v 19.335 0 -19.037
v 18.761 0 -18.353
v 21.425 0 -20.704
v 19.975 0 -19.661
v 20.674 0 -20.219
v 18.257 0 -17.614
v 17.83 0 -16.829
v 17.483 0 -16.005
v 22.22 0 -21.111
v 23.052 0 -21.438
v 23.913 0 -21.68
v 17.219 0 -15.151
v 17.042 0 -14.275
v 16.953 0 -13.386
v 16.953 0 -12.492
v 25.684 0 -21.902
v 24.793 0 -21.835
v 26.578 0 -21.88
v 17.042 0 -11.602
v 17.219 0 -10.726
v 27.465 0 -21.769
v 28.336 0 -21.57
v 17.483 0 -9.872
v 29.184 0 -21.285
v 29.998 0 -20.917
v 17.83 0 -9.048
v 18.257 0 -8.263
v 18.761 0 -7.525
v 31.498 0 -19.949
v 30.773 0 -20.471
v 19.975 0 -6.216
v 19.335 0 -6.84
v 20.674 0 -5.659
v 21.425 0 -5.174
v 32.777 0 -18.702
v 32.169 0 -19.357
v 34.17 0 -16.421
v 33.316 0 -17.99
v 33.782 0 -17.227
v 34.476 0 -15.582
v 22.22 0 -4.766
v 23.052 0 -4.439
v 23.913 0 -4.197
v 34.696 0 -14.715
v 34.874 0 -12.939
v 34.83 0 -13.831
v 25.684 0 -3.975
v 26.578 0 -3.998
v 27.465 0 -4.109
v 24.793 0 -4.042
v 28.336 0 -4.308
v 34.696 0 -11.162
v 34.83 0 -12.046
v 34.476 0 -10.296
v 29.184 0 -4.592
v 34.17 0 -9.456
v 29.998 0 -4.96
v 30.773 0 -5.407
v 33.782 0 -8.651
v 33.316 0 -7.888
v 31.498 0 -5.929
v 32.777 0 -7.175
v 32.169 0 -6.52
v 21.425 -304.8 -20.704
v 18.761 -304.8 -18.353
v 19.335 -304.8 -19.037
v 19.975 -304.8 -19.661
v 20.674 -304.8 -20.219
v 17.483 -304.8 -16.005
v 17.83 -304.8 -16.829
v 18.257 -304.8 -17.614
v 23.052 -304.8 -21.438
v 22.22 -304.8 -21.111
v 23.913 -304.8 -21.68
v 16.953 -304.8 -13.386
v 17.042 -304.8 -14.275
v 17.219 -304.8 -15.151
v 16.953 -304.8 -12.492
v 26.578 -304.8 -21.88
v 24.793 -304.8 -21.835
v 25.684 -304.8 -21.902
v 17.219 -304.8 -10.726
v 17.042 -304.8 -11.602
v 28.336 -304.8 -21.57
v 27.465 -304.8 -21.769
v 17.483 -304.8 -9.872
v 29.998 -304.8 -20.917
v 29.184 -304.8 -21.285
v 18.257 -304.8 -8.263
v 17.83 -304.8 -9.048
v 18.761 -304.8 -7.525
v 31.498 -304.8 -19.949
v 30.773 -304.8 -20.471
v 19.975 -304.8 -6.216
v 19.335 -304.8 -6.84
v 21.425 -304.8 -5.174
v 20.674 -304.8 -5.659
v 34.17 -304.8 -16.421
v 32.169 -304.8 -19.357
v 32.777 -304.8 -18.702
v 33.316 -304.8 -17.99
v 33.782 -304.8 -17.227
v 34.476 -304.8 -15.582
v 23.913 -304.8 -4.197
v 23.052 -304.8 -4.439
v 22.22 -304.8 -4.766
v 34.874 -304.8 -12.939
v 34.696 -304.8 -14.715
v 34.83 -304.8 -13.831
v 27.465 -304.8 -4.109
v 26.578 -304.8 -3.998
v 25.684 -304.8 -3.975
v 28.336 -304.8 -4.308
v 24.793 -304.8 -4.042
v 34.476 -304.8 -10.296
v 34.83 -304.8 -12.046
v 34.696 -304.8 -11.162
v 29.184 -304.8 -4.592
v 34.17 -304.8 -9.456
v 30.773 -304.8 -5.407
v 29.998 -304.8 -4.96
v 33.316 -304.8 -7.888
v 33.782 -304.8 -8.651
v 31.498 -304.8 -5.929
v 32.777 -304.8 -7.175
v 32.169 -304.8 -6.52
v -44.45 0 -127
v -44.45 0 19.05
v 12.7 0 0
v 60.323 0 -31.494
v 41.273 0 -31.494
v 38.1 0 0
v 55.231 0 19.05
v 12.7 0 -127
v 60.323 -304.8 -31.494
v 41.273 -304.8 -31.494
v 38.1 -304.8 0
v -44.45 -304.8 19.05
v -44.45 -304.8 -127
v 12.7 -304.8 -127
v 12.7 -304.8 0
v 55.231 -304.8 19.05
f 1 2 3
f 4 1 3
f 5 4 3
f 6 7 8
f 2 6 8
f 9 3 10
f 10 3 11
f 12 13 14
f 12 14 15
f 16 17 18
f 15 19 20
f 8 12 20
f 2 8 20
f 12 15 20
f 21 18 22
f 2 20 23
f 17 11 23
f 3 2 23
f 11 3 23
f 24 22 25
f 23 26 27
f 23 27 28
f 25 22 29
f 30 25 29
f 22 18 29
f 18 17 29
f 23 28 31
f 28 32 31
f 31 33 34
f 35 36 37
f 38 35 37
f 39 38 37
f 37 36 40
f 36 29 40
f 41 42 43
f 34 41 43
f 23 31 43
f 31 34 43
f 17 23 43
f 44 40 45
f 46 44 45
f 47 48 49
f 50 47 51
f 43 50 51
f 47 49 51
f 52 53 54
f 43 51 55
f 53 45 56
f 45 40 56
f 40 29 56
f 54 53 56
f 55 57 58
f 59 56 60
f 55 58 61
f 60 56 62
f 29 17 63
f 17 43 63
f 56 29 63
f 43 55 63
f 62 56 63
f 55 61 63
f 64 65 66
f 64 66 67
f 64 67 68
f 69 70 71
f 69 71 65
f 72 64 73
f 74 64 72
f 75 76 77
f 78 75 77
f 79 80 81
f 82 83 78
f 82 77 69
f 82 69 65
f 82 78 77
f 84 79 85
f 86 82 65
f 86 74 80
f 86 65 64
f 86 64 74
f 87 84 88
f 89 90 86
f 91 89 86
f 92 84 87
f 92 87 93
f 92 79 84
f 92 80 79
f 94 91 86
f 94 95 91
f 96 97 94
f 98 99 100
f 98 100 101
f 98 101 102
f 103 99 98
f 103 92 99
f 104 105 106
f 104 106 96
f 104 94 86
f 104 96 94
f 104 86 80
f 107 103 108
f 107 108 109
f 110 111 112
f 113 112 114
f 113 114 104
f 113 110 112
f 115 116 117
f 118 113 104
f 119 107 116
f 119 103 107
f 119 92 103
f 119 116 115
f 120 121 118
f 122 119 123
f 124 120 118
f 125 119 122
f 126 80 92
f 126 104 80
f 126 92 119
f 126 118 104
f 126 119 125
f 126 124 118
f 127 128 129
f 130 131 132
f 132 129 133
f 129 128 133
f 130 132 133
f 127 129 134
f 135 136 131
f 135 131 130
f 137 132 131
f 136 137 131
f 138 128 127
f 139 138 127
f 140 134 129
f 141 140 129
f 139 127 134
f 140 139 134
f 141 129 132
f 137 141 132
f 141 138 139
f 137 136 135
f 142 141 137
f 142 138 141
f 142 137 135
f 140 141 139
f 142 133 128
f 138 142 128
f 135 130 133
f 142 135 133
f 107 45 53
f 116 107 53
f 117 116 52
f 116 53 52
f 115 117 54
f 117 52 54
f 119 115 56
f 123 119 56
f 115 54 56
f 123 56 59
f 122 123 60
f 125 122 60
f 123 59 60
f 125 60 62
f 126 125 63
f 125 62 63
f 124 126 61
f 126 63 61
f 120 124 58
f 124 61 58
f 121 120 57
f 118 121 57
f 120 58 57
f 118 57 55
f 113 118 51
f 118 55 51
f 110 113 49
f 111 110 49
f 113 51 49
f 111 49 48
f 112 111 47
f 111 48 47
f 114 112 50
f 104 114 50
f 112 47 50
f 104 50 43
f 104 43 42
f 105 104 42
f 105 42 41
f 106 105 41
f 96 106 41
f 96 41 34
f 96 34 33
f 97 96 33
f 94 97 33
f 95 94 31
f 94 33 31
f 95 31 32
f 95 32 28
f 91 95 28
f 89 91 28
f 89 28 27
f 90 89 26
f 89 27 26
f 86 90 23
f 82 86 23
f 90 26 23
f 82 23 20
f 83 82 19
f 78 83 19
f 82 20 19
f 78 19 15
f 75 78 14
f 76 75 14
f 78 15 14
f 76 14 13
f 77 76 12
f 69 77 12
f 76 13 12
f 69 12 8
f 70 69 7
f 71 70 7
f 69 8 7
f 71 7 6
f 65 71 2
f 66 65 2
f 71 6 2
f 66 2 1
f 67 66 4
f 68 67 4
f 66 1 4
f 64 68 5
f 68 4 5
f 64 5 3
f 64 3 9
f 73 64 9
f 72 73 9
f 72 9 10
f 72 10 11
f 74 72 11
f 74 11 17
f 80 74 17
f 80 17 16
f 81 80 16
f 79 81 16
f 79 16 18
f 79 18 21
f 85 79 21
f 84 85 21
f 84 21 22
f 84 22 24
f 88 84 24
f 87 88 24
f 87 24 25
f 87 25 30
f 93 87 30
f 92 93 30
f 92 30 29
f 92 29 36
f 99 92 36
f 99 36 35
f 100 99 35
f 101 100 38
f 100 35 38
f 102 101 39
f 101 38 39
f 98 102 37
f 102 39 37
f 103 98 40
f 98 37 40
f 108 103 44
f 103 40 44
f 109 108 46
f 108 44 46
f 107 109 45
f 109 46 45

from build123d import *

# Parameters (mm, degrees)
F0_W     = 44.45
F0_H     = 127
F0_W_2   = 12.7
F0_R     = 8.9662
F1_DEPTH = 304.8


with BuildPart() as f1:
    # F0 (on Front) → F1 (new body)
    with BuildSketch(Plane.XZ):
        with Locations((-22.225, -63.5)):
            Rectangle(F0_W, F0_H)
        Polygon((36.180928, 19.05), (38.1, 0), (41.272682, -31.494179), (60.322682, -31.494179), (55.230928, 19.05), align=None)
        Polygon((-44.45, 0), (0, 0), (12.7, 0), (38.1, 0), (36.180928, 19.05), (-44.45, 19.05), align=None)
        with Locations((6.35, -63.5)):
            Rectangle(F0_W_2, F0_H)
        with Locations((25.907997, -12.938708)):
            Circle(F0_R)
    extrude(amount=F1_DEPTH)


solid = f1.part
